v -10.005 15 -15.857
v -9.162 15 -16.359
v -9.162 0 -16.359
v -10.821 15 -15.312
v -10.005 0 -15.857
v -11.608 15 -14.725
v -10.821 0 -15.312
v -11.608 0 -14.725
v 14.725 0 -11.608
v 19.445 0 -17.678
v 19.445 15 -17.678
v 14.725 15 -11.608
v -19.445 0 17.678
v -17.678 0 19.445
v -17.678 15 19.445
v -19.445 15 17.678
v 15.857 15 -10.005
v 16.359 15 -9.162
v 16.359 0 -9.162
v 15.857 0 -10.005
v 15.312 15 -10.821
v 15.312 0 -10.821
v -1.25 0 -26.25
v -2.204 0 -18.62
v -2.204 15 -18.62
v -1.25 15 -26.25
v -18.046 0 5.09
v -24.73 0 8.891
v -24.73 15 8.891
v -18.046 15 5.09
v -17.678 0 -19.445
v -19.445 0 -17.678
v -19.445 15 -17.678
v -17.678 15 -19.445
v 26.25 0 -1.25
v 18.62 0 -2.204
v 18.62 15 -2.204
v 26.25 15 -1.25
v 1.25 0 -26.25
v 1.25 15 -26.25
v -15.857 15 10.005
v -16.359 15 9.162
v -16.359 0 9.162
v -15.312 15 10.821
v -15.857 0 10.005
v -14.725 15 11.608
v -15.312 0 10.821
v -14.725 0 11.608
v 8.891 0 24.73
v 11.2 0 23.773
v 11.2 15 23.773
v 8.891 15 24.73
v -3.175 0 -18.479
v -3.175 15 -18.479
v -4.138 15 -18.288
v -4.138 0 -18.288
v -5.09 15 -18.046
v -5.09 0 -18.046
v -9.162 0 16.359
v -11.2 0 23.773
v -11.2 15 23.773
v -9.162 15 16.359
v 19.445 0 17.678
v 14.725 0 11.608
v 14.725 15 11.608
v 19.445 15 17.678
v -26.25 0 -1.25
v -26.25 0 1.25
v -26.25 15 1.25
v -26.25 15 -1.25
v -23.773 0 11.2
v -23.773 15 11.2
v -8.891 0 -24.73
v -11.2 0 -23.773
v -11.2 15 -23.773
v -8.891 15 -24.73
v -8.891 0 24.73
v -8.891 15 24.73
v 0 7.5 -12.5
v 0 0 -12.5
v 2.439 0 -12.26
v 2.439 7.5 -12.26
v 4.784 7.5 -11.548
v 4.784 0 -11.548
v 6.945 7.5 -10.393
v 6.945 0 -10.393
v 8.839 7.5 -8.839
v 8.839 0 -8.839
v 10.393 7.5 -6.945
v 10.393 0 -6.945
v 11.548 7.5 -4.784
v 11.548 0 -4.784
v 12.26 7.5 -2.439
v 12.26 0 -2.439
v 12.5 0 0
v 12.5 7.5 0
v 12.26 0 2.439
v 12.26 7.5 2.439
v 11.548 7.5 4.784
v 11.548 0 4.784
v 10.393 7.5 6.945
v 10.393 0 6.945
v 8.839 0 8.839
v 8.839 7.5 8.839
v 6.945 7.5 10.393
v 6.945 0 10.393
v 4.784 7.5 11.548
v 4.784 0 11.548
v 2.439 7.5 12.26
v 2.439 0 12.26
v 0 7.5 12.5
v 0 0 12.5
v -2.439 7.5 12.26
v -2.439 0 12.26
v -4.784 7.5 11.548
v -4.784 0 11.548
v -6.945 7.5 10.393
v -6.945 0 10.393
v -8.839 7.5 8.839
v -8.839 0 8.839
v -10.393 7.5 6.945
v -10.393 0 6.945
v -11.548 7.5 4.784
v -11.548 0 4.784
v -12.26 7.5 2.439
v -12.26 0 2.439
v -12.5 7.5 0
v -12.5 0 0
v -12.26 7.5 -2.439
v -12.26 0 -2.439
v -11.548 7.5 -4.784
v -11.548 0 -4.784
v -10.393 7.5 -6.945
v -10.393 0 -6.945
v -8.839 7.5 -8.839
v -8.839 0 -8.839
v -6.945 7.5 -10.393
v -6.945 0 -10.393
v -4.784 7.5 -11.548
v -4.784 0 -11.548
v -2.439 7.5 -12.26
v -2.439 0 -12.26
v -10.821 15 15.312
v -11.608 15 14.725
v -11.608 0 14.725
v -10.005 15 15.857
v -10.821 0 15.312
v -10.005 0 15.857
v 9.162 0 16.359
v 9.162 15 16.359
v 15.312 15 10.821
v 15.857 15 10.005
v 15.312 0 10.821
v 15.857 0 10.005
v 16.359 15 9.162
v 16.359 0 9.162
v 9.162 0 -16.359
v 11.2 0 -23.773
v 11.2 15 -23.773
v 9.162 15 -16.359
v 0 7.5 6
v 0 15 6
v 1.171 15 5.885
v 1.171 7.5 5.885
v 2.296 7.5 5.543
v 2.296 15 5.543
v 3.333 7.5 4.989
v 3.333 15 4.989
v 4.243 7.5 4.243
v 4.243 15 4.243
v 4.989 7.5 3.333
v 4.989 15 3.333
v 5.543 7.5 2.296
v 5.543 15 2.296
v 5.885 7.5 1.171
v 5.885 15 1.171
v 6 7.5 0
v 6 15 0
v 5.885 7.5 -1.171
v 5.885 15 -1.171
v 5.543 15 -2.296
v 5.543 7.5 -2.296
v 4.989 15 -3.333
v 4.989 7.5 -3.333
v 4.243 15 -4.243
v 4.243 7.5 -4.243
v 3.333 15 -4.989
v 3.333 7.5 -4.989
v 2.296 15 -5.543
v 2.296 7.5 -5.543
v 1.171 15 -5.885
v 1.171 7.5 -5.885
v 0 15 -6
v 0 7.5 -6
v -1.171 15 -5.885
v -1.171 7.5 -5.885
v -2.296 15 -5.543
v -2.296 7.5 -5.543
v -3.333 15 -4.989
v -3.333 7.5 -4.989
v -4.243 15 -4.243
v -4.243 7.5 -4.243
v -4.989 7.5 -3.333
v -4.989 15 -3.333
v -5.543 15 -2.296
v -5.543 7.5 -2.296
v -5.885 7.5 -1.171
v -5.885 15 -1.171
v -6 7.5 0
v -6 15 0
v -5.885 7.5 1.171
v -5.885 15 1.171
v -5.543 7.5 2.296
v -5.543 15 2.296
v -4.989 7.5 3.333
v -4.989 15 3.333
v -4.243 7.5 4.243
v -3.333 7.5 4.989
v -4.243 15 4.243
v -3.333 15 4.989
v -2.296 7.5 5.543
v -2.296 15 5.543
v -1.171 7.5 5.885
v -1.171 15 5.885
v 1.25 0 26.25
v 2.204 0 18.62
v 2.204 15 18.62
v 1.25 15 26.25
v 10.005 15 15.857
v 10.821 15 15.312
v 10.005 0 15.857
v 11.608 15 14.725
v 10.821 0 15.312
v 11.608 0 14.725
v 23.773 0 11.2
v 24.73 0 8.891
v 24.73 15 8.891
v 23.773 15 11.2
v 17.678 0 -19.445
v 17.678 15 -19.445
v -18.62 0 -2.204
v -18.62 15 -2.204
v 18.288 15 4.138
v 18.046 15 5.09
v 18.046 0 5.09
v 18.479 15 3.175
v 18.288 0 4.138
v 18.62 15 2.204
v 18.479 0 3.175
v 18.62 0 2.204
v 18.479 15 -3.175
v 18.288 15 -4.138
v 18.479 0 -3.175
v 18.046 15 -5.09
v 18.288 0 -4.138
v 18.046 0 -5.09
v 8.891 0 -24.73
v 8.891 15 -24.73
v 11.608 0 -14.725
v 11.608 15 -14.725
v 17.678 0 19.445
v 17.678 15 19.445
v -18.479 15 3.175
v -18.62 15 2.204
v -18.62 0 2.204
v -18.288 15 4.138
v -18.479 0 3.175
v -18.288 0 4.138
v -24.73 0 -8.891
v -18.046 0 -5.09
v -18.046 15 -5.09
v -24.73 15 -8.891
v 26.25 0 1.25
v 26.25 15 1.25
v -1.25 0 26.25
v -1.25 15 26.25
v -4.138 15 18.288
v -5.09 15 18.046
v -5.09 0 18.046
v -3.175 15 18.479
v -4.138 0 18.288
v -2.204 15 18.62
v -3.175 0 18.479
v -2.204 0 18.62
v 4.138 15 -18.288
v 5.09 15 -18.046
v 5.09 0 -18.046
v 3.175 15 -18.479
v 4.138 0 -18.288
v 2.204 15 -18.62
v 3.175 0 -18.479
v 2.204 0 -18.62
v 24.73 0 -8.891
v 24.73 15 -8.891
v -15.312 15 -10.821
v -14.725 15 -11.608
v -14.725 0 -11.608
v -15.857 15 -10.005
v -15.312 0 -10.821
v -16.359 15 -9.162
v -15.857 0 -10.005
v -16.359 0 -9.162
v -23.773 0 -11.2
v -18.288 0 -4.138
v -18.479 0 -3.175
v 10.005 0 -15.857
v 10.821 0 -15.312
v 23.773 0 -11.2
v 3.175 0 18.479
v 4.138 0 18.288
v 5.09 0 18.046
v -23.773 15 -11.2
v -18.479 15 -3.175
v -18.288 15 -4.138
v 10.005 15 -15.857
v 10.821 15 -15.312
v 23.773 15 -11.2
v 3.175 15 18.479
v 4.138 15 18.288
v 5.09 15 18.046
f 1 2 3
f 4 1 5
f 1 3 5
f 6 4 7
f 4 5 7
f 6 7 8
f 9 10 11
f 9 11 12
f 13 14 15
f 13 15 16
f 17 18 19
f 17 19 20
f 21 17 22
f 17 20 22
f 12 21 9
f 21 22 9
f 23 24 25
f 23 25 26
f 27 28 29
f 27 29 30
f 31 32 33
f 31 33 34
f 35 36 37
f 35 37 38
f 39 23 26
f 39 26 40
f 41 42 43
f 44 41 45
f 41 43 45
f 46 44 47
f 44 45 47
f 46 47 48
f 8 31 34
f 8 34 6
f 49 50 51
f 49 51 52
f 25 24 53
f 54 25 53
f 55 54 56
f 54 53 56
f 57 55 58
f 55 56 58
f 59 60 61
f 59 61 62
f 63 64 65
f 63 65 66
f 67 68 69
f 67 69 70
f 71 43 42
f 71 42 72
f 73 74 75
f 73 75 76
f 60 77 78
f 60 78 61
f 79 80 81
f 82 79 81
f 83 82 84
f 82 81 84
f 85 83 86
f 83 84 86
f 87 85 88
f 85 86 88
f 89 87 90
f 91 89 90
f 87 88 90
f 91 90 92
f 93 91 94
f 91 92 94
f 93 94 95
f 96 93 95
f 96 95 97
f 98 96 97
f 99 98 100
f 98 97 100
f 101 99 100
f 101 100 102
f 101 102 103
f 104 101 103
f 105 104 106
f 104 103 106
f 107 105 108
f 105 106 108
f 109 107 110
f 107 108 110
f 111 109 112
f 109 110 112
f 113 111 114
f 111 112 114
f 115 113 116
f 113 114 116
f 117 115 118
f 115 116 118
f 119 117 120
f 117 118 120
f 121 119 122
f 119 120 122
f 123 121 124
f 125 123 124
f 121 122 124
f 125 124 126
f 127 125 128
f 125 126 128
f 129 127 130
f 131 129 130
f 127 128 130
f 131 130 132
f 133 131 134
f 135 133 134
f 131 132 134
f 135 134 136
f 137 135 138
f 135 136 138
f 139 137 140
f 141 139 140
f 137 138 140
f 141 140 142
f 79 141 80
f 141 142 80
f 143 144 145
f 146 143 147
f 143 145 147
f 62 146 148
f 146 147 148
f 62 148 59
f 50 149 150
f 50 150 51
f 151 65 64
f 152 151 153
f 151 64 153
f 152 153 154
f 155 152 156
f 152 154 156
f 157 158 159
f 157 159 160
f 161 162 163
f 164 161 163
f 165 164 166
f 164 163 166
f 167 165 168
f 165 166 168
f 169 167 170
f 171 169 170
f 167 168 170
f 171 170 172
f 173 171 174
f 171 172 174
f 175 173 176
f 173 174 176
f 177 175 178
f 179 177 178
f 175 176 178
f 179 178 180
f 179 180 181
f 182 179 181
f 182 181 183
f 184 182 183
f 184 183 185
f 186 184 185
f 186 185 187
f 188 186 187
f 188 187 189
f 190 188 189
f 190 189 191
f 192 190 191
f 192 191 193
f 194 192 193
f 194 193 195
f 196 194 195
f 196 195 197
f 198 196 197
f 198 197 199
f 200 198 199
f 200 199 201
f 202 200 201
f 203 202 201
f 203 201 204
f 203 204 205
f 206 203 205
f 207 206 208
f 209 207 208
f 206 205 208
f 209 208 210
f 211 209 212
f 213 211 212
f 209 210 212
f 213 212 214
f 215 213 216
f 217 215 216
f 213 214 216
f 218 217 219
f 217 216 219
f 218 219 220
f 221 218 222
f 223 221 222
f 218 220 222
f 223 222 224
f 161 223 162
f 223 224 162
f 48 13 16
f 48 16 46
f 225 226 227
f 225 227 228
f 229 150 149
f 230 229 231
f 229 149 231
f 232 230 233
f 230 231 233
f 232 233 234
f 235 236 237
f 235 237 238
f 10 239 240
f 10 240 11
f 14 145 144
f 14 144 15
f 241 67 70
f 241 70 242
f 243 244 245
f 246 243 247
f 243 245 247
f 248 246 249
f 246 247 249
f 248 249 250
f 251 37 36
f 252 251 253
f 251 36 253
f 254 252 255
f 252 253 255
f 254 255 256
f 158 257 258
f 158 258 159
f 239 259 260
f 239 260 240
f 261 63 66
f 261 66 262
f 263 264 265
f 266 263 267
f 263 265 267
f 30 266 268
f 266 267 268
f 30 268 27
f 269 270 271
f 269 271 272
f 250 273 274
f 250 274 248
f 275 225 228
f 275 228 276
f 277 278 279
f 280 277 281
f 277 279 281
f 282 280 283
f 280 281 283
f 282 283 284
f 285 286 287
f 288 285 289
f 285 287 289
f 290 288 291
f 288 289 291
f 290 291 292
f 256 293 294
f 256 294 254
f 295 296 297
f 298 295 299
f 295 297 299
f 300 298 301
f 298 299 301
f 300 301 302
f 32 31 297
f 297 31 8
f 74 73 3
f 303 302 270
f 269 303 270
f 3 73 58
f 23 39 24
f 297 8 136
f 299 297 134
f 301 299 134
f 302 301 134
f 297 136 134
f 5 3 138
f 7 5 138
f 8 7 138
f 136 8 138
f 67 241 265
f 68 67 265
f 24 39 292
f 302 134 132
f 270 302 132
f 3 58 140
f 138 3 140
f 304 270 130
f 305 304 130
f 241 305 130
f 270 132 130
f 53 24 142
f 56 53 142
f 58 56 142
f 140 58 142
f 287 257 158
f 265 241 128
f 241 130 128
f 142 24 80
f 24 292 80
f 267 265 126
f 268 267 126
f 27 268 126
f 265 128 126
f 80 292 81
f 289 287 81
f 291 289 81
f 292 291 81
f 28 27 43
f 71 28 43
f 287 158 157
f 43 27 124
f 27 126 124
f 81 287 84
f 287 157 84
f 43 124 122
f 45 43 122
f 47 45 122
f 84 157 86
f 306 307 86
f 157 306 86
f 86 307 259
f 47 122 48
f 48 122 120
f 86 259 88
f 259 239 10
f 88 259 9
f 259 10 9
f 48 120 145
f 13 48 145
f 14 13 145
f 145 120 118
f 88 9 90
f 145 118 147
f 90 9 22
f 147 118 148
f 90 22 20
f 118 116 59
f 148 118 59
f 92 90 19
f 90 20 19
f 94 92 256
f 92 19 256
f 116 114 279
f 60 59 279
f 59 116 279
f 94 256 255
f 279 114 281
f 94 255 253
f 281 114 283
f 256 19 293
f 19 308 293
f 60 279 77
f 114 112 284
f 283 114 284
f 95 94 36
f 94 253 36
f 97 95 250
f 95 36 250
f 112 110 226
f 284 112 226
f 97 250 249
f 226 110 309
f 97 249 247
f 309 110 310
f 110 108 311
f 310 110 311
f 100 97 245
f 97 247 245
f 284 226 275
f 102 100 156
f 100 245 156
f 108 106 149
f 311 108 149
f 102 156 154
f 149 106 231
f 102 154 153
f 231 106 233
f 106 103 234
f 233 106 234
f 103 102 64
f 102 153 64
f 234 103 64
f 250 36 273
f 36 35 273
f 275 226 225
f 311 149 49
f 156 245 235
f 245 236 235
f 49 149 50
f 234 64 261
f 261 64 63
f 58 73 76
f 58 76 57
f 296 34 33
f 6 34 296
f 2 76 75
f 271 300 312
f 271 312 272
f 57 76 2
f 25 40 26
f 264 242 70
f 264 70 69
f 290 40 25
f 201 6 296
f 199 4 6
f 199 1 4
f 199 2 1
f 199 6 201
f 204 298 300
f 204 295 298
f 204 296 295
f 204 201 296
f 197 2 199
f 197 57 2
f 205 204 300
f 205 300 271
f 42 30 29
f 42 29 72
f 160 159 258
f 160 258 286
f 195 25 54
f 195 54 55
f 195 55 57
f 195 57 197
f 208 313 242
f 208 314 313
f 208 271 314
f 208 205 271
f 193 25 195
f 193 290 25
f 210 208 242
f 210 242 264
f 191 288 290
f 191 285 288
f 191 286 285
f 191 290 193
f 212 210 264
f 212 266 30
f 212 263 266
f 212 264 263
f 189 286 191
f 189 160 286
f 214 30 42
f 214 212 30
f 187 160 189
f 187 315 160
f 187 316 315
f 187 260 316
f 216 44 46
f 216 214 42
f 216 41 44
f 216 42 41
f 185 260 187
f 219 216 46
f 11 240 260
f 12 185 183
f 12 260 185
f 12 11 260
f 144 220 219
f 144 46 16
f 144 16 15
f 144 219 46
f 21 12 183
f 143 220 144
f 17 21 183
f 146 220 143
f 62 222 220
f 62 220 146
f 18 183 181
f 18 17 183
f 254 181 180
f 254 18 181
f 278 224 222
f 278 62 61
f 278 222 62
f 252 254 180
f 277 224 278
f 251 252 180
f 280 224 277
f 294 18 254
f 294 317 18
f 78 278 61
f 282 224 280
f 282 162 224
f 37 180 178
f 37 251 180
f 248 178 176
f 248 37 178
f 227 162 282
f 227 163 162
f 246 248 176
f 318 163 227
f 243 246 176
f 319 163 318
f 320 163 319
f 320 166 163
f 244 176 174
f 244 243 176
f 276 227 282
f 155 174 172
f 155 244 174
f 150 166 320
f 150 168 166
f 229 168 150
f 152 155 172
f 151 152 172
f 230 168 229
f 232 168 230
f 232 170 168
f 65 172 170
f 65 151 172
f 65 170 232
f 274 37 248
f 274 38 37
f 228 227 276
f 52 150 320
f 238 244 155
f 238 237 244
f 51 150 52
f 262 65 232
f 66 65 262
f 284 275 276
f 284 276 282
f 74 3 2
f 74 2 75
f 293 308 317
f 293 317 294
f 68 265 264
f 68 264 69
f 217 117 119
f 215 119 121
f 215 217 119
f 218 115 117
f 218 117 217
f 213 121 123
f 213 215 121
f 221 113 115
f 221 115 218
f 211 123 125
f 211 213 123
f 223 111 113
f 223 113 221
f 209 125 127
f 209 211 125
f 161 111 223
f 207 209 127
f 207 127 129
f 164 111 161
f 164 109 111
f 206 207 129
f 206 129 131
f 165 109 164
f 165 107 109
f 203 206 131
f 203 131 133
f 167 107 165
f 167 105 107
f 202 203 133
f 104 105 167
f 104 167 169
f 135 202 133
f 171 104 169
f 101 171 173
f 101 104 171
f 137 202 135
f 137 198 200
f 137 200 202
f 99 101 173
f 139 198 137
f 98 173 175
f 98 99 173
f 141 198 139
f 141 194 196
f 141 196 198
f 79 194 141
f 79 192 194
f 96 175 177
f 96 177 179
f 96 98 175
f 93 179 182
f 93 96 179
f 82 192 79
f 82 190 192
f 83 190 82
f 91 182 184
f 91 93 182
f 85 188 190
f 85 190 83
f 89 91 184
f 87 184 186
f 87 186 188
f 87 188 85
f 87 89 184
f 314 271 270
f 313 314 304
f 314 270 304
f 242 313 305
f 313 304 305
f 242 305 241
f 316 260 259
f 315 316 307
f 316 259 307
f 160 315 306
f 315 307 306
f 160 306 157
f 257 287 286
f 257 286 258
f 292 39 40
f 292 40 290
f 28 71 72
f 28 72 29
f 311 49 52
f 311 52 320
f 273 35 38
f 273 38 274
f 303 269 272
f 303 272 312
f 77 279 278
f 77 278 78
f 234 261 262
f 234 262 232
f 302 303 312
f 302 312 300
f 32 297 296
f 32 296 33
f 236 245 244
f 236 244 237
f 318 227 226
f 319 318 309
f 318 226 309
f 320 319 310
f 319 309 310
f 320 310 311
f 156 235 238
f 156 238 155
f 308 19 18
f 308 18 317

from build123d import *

# Parameters (mm, degrees)
SKETCH1_R           = 18.75
BOSS_EXTRUDE1_DEPTH = 15
BOSS_EXTRUDE2_START = -15
BOSS_EXTRUDE2_DEPTH = 15
CIRPATTERN1_COUNT   = 16
SKETCH3_R           = 6
CUT_EXTRUDE1_DEPTH  = 41.039043445
SKETCH4_R           = 12.5
CUT_EXTRUDE2_DEPTH  = 7.5


with BuildPart() as part:
    # Sketch1 → Boss-Extrude1 (new body)
    with BuildSketch(Plane(origin=(0, 0, 0), x_dir=(1, 0, 0), z_dir=(0, 1, 0))):
        with Locations(Location((0, 0, 0), (0, 0, 270))):
            Circle(SKETCH1_R)
    extrude(amount=BOSS_EXTRUDE1_DEPTH)

    # Sketch2 → Boss-Extrude2 (add)
    with BuildSketch(Plane(origin=(0, 15, 0), x_dir=(1, 0, 0), z_dir=(0, 1, 0)).offset(BOSS_EXTRUDE2_START)):
        with BuildLine():
            Line((-1.25, 26.25), (1.25, 26.25))
            Line((1.25, 26.25), (2.203742352, 18.620043492))
            ThreePointArc((2.203742352, 18.620043492), (0, 18.75), (-2.203742352, 18.620043492))
            Line((-2.203742352, 18.620043492), (-1.25, 26.25))
        make_face()
    boss_extrude2 = extrude(amount=BOSS_EXTRUDE2_DEPTH)

    # CirPattern1: Boss-Extrude2 ×16 about axis
    cirpattern1_axis = Axis((0, 0, 0), (0, 1, 0))
    for i in range(1, CIRPATTERN1_COUNT):
        add(boss_extrude2.rotate(cirpattern1_axis, i * 360 / CIRPATTERN1_COUNT))

    # Sketch3 → Cut-Extrude1 (cut, through all)
    with BuildSketch(Plane(origin=(0, 15, 0), x_dir=(1, 0, 0), z_dir=(0, 1, 0))):
        with Locations(Location((0, 0, 0), (0, 0, 270))):
            Circle(SKETCH3_R)
    extrude(amount=-CUT_EXTRUDE1_DEPTH, mode=Mode.SUBTRACT)

    # Sketch4 → Cut-Extrude2 (cut)
    with BuildSketch(Plane(origin=(0, 0, 0), x_dir=(-1, 0, 0), z_dir=(0, -1, 0))):
        with Locations(Location((0, 0, 0), (0, 0, 90))):
            Circle(SKETCH4_R)
    extrude(amount=-CUT_EXTRUDE2_DEPTH, mode=Mode.SUBTRACT)


solid = part.part
